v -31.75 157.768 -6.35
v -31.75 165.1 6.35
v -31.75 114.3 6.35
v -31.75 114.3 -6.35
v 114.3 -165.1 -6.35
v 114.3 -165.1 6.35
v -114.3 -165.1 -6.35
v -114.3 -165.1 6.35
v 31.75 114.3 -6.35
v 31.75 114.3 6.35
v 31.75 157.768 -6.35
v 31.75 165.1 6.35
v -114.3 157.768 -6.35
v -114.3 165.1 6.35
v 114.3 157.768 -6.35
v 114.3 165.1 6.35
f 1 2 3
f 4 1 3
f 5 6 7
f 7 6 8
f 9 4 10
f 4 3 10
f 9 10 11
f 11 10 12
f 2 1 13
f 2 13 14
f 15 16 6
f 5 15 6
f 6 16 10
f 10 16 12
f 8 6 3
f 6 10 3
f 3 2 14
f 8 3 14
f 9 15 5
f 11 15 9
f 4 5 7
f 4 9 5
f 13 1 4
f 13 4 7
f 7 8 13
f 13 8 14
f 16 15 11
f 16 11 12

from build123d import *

# Parameters (mm, degrees)
BOSS_EXTRUDE1_DEPTH = 6.35
CUT_EXTRUDE1_DEPTH  = 127


with BuildPart() as part:
    # Sketch1 → Boss-Extrude1 (new, symmetric)
    with BuildSketch(Plane.XY):
        Polygon((114.3, -165.1), (-114.3, -165.1), (-114.3, 165.1), (-31.75, 165.1), (-31.75, 114.3), (31.75, 114.3), (31.75, 165.1), (114.3, 165.1), align=None)
    extrude(amount=BOSS_EXTRUDE1_DEPTH, both=True)

    # Sketch2 → Cut-Extrude1 (cut, symmetric)
    with BuildSketch(Plane(origin=(0, 0, 0), x_dir=(0, 0, -1), z_dir=(1, 0, 0))):
        Polygon((-6.35, 165.1), (6.35, 165.1), (6.35, 157.767651581), align=None)
    extrude(amount=CUT_EXTRUDE1_DEPTH, both=True, mode=Mode.SUBTRACT)


solid = part.part
